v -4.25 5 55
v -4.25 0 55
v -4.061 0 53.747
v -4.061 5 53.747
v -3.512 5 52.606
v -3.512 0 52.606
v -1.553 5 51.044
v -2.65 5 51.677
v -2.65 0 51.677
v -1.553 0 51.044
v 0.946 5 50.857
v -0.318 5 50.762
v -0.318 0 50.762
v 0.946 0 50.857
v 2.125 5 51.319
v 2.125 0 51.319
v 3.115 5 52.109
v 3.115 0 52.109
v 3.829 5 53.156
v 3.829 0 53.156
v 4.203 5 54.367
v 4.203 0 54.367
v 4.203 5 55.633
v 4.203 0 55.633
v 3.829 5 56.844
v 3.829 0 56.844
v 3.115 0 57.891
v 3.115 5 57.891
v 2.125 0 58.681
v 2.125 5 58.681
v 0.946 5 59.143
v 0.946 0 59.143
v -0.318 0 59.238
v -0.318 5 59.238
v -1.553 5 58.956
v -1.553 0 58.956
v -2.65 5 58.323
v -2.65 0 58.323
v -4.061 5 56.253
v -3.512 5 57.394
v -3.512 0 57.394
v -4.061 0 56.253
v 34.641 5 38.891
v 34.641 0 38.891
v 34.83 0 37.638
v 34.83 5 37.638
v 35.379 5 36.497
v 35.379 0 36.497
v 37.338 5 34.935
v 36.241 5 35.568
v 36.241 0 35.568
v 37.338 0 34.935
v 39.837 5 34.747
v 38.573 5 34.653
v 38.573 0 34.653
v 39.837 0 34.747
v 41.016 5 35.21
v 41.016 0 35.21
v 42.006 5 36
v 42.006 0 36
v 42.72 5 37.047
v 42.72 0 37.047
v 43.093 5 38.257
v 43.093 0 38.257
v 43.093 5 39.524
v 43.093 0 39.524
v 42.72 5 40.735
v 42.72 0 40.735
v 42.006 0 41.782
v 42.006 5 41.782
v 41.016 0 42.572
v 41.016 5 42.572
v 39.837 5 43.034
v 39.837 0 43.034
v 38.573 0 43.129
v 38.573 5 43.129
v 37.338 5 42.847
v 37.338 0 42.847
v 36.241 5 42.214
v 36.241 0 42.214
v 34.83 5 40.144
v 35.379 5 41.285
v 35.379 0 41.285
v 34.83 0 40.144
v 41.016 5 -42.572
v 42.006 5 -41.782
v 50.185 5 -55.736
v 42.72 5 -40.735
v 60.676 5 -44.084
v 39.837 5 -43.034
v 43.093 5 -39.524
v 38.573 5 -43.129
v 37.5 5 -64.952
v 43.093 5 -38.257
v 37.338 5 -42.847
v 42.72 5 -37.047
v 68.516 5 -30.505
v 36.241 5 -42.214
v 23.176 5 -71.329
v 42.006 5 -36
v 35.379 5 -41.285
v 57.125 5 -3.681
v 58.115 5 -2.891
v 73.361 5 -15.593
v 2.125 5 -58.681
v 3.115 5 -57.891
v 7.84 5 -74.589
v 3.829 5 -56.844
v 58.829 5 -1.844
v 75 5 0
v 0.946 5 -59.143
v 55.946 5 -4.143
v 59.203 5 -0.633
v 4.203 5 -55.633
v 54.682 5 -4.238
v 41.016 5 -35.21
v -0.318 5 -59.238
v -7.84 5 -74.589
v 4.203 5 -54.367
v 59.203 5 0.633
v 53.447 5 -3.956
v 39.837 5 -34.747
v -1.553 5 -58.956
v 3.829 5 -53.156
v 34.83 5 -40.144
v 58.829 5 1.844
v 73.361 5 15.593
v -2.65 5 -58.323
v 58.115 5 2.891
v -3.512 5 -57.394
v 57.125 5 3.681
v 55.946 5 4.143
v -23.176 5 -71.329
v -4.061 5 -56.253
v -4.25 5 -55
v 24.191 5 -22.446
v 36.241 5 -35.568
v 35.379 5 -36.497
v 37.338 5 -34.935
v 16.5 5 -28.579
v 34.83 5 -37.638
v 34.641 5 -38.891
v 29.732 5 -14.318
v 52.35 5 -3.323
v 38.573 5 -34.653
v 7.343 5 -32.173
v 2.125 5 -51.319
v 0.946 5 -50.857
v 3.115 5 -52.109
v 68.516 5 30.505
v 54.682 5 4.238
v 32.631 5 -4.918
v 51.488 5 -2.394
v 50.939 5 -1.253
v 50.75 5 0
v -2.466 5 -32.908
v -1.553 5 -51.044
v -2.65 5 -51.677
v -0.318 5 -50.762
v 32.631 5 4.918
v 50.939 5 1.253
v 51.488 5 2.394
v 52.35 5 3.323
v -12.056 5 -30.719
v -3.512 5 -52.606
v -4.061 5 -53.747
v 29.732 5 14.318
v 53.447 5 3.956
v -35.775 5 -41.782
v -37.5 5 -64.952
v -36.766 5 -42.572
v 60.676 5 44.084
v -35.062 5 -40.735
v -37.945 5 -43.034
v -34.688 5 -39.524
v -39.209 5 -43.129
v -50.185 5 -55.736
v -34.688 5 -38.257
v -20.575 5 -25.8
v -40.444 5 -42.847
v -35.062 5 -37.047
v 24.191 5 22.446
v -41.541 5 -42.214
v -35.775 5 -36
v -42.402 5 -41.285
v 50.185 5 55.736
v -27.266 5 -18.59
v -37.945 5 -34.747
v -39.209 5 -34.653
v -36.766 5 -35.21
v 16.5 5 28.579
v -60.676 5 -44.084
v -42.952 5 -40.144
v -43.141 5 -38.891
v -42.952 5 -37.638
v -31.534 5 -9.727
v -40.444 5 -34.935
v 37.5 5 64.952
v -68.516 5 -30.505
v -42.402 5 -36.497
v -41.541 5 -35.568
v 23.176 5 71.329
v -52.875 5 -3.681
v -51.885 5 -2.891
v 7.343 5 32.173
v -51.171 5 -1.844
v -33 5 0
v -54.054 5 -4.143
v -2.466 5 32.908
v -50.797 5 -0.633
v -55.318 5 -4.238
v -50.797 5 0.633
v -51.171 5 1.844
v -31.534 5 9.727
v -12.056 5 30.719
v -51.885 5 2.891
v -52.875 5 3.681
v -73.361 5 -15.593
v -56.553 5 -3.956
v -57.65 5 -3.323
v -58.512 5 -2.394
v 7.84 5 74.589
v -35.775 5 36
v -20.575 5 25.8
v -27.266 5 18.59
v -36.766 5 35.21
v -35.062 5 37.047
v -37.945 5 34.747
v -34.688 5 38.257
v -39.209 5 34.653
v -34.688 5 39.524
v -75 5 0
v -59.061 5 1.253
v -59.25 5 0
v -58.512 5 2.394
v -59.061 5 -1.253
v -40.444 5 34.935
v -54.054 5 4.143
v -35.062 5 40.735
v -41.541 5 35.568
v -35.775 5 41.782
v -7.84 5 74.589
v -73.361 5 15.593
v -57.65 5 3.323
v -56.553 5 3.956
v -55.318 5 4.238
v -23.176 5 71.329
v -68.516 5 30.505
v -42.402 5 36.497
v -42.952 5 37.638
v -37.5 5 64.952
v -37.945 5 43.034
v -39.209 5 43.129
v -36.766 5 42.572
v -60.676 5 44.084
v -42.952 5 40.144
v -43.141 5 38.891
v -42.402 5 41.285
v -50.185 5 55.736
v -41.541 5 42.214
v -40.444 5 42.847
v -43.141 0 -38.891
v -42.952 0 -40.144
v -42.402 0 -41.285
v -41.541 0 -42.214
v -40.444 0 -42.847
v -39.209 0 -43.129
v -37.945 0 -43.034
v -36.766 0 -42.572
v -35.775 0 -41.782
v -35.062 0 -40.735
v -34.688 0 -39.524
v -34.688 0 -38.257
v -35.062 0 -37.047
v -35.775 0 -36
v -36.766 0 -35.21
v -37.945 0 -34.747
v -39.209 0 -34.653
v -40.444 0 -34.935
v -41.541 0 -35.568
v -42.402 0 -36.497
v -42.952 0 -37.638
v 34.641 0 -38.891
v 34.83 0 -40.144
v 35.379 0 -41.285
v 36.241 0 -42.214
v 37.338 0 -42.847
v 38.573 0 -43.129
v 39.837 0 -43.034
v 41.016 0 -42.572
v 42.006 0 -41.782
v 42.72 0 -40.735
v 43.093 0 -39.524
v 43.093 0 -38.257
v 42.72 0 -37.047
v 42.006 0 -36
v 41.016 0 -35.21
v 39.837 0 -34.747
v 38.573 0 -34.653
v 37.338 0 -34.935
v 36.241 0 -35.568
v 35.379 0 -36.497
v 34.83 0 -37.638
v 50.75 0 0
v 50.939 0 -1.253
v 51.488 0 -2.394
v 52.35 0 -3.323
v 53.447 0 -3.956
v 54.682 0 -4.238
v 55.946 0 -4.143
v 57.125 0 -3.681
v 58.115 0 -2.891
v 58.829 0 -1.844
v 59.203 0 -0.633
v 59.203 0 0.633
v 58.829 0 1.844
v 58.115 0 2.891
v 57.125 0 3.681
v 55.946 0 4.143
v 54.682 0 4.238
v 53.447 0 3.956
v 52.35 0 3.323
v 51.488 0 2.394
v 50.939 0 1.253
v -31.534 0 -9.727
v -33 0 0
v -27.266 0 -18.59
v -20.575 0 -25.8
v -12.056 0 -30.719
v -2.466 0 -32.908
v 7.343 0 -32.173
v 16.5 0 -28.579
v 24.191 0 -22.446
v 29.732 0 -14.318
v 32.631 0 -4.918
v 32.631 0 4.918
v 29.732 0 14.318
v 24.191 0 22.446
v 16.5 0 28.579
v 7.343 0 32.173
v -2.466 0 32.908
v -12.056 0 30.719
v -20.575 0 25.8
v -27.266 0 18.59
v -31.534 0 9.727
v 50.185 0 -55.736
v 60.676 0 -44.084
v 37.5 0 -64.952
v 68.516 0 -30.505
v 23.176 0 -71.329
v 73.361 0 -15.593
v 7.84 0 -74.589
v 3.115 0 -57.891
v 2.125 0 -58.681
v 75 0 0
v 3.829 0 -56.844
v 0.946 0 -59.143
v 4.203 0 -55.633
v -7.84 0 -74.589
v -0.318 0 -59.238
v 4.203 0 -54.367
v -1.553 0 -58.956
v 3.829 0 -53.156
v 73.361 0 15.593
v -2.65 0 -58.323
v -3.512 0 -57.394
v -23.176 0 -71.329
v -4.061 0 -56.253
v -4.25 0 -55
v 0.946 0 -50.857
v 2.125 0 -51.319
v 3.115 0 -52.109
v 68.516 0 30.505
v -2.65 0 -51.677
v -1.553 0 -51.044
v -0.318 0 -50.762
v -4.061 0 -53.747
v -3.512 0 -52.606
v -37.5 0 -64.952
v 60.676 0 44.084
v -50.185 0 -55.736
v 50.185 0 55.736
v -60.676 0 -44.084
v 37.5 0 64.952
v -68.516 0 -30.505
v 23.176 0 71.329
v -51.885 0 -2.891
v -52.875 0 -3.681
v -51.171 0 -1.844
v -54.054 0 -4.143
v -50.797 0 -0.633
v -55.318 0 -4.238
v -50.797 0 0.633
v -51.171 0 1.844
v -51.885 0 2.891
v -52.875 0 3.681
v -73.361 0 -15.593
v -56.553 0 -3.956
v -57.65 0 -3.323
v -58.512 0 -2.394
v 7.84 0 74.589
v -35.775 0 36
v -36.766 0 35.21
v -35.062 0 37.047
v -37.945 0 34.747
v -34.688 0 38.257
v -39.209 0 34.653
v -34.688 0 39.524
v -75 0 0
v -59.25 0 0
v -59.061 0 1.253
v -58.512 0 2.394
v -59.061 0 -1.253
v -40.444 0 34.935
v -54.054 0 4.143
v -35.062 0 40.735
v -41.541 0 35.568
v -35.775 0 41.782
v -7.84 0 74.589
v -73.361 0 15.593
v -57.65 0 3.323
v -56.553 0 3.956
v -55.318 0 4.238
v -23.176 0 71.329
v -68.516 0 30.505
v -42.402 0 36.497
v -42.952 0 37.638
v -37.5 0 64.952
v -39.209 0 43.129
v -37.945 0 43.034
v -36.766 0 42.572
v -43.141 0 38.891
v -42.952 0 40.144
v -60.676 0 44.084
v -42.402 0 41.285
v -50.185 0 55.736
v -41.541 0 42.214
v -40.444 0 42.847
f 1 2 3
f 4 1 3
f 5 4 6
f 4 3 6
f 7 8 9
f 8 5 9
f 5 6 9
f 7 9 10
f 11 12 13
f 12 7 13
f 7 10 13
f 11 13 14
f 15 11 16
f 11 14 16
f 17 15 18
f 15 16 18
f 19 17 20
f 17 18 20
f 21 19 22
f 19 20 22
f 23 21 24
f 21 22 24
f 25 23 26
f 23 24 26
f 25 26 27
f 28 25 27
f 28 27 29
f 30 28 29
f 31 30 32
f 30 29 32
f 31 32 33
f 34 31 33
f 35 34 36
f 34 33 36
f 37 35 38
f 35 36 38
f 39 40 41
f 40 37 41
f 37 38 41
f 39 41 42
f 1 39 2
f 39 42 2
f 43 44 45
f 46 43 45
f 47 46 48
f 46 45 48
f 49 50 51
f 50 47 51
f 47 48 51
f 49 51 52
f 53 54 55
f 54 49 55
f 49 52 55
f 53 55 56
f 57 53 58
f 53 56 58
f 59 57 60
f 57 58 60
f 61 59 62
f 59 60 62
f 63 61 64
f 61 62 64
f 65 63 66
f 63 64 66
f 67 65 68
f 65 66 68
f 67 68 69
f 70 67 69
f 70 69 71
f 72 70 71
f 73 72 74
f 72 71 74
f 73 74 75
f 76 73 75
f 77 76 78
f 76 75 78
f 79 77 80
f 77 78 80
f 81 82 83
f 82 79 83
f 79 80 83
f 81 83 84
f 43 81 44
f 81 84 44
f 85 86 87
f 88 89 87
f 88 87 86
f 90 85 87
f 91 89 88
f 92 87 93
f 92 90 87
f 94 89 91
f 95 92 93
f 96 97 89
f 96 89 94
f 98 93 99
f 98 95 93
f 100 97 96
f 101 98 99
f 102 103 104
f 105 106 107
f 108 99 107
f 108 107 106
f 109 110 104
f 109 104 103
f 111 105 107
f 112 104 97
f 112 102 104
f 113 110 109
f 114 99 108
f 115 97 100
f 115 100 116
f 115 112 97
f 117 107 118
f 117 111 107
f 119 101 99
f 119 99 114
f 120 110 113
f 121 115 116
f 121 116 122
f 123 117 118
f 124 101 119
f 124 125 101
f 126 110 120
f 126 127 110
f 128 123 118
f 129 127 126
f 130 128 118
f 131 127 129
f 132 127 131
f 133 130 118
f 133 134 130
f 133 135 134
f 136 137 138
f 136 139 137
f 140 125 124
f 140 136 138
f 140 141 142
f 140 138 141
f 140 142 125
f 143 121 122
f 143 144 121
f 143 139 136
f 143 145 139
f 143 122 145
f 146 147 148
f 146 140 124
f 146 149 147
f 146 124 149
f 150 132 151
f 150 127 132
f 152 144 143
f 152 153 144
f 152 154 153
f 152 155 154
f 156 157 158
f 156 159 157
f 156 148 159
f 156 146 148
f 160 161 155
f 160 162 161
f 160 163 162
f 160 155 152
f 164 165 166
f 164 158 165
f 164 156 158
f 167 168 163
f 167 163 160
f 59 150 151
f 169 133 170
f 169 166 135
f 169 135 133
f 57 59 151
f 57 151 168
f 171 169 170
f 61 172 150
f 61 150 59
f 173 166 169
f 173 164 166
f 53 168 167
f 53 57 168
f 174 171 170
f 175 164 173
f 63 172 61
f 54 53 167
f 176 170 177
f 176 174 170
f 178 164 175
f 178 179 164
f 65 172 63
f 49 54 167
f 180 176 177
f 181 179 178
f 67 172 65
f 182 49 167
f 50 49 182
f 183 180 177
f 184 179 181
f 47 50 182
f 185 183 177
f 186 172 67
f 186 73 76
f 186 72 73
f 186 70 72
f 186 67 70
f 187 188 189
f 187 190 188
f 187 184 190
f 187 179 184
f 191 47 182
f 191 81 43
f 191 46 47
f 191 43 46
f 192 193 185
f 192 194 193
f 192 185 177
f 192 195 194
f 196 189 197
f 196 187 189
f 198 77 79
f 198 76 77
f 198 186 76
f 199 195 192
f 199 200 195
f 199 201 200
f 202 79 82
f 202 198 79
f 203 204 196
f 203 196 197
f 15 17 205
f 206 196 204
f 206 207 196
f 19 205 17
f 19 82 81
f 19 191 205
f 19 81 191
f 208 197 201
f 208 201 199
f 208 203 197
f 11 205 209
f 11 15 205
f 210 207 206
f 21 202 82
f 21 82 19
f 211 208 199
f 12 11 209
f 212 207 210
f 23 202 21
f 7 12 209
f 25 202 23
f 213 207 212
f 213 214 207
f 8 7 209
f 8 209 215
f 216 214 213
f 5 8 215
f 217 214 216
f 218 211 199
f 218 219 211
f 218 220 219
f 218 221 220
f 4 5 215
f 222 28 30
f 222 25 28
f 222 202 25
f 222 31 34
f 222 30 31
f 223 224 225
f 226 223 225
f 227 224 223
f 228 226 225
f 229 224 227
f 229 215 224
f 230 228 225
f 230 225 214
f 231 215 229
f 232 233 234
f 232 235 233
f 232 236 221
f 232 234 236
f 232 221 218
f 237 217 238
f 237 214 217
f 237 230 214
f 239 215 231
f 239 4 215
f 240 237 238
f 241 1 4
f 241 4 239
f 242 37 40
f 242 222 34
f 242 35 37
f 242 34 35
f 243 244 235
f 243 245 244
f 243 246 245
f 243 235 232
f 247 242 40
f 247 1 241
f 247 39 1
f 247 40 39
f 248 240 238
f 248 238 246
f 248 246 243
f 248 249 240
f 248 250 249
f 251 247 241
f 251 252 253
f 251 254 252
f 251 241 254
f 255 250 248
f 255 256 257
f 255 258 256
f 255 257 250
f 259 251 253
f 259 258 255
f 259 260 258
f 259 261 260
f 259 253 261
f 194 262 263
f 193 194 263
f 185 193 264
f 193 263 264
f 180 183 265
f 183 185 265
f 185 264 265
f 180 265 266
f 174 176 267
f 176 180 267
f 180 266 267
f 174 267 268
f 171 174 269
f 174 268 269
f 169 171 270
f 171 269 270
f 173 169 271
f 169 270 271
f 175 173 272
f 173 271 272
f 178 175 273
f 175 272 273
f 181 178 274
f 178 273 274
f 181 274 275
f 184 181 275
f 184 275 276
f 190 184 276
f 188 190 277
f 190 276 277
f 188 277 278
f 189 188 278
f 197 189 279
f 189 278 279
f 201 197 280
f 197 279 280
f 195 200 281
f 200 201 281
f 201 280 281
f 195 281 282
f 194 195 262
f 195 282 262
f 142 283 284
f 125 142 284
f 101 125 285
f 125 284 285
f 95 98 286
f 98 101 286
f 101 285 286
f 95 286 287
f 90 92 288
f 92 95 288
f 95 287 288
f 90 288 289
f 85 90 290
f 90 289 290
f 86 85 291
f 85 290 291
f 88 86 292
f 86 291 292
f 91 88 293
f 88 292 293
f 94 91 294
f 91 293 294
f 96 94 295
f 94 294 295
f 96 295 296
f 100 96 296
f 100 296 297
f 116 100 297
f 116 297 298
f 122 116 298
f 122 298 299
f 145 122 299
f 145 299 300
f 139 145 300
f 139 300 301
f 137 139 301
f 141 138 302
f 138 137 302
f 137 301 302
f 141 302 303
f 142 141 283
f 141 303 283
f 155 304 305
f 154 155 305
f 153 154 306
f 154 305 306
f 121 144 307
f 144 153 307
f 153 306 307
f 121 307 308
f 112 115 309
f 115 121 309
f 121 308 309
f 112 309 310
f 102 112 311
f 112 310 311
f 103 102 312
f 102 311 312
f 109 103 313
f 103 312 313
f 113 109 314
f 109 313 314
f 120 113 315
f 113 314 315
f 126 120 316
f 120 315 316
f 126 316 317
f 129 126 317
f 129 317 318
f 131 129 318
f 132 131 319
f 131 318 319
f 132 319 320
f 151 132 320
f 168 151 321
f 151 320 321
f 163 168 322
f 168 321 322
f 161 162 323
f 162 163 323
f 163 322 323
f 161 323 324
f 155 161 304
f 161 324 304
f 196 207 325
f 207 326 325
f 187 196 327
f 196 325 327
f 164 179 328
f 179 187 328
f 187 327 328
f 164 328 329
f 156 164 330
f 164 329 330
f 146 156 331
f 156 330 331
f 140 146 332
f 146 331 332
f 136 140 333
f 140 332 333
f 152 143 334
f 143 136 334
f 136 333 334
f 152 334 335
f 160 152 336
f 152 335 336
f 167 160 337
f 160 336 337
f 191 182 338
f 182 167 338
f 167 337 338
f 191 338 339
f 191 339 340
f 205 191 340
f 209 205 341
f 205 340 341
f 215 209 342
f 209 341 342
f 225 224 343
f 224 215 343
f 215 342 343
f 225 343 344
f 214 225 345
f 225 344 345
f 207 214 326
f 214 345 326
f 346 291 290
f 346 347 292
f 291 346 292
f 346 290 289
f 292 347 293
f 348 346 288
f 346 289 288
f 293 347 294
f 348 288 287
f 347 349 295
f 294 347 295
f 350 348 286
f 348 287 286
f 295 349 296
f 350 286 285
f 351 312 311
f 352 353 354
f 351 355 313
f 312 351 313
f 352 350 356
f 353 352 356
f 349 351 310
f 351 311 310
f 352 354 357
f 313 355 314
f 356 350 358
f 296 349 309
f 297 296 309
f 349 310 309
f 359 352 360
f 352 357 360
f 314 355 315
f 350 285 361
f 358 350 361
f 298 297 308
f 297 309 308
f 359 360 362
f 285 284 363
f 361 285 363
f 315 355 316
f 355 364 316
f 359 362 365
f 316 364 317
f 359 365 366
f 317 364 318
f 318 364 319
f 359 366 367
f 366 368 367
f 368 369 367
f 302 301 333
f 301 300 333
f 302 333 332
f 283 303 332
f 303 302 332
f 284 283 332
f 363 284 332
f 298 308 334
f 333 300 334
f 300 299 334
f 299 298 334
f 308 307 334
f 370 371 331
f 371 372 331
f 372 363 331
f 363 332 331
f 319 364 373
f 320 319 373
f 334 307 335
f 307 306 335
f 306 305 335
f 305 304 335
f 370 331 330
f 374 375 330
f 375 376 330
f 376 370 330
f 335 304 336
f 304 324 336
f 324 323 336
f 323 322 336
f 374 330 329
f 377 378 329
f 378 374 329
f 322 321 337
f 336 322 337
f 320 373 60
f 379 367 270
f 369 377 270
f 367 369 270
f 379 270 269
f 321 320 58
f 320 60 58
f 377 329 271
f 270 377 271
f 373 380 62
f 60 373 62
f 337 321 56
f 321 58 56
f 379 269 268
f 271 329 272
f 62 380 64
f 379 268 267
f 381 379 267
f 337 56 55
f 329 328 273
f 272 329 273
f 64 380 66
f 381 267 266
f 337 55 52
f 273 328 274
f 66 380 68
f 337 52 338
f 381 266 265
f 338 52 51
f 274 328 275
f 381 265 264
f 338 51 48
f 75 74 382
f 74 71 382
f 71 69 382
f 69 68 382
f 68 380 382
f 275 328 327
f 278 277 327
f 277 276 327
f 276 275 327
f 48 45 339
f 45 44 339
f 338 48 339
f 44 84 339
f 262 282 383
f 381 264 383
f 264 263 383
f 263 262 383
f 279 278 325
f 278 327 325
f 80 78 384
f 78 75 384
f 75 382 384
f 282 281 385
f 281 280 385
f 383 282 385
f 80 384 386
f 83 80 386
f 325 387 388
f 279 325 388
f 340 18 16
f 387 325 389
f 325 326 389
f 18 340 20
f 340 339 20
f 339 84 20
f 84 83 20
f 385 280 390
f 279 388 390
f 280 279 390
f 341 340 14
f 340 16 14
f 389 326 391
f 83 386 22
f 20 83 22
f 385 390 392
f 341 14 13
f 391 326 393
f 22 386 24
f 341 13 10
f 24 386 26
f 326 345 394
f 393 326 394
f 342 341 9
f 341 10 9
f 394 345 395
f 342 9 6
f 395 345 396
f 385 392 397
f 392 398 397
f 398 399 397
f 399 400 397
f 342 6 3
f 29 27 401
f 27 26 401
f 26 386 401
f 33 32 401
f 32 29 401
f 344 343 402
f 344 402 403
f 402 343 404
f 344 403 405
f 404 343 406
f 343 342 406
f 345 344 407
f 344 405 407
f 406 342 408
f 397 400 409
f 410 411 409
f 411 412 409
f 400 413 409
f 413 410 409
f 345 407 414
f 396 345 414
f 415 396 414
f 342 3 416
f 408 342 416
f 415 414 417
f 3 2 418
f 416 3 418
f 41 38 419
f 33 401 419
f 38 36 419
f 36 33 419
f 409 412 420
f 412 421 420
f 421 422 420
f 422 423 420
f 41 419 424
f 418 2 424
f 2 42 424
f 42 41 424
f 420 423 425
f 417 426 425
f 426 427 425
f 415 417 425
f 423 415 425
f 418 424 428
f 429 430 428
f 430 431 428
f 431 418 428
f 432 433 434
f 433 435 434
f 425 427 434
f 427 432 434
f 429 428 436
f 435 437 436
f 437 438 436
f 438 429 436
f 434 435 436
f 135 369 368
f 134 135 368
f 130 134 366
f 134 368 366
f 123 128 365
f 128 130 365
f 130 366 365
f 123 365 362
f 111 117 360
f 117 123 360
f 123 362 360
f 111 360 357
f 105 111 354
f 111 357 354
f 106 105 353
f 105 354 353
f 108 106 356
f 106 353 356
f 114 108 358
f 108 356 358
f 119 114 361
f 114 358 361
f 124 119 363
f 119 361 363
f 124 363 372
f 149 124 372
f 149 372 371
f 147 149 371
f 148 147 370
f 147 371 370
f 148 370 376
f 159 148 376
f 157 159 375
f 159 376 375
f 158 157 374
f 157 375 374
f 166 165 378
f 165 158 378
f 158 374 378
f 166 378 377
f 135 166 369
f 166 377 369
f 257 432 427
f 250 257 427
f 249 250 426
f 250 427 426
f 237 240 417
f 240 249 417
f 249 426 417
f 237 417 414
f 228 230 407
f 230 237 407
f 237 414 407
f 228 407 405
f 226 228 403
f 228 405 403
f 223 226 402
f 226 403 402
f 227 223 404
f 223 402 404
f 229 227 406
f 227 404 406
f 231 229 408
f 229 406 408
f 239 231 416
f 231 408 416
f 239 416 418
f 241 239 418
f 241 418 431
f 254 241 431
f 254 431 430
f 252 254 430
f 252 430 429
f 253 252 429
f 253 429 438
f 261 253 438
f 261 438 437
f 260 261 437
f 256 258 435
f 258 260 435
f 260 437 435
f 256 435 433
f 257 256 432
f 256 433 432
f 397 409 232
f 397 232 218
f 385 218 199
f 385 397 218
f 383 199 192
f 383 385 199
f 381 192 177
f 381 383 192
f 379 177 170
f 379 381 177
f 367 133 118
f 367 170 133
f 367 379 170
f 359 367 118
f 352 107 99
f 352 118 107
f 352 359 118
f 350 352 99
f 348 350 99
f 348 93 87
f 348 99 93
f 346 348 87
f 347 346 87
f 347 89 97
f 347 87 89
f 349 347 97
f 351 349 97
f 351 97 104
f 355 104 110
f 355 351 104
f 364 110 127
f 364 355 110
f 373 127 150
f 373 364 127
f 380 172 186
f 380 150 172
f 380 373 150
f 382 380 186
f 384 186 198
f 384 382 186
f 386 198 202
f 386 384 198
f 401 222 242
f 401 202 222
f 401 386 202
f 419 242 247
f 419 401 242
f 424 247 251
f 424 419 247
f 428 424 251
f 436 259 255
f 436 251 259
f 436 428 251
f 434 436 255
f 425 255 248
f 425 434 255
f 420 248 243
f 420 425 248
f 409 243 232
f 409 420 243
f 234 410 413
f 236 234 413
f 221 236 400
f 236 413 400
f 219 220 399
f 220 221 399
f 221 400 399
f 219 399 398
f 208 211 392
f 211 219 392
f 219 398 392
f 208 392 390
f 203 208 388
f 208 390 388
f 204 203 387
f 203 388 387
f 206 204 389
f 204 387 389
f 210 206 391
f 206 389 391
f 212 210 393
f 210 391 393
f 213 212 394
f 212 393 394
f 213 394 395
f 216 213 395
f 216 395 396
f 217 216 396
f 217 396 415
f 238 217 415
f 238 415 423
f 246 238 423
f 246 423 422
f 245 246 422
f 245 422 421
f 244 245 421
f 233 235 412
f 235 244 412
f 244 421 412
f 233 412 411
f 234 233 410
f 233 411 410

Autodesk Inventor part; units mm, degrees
ref_plane "YZ Plane" through (0, 0, 0) normal (1, 0, 0) x (0, 1, 0)
ref_plane "XZ Plane" through (0, 0, 0) normal (0, 1, 0) x (-1, 0, 0)
ref_plane "XY Plane" through (0, 0, 0) normal (0, 0, 1) x (1, 0, 0)
sketch "Sketch1" plane through (0, 0, 0) normal (0, 1, 0) x (-1, 0, 0)
  circle A0 centre (0, 0) radius 75
  circle A1 centre (0, 0) radius 33
  circle A2 centre (55, 0) radius 4.25
  circle A3 centre (38.8909, 38.8909) radius 4.25
  circle A4 centre (0, 55) radius 4.25
  circle A5 centre (-38.8909, 38.8909) radius 4.25
  circle A6 centre (-55, 0) radius 4.25
  circle A7 centre (-38.8909, -38.8909) radius 4.25
  circle A8 centre (0, -55) radius 4.25
  circle A9 centre (38.8909, -38.8909) radius 4.25
  dimension "d0" = 150
  dimension "d1" = 66
  dimension "d2" = 55
  dimension "d3" = 8.5
  dimension "d6" = 360
extrude "Extrusion1" add sketch "Sketch1" along normal blind 5
properties part number "plateHole" material "Steel"
